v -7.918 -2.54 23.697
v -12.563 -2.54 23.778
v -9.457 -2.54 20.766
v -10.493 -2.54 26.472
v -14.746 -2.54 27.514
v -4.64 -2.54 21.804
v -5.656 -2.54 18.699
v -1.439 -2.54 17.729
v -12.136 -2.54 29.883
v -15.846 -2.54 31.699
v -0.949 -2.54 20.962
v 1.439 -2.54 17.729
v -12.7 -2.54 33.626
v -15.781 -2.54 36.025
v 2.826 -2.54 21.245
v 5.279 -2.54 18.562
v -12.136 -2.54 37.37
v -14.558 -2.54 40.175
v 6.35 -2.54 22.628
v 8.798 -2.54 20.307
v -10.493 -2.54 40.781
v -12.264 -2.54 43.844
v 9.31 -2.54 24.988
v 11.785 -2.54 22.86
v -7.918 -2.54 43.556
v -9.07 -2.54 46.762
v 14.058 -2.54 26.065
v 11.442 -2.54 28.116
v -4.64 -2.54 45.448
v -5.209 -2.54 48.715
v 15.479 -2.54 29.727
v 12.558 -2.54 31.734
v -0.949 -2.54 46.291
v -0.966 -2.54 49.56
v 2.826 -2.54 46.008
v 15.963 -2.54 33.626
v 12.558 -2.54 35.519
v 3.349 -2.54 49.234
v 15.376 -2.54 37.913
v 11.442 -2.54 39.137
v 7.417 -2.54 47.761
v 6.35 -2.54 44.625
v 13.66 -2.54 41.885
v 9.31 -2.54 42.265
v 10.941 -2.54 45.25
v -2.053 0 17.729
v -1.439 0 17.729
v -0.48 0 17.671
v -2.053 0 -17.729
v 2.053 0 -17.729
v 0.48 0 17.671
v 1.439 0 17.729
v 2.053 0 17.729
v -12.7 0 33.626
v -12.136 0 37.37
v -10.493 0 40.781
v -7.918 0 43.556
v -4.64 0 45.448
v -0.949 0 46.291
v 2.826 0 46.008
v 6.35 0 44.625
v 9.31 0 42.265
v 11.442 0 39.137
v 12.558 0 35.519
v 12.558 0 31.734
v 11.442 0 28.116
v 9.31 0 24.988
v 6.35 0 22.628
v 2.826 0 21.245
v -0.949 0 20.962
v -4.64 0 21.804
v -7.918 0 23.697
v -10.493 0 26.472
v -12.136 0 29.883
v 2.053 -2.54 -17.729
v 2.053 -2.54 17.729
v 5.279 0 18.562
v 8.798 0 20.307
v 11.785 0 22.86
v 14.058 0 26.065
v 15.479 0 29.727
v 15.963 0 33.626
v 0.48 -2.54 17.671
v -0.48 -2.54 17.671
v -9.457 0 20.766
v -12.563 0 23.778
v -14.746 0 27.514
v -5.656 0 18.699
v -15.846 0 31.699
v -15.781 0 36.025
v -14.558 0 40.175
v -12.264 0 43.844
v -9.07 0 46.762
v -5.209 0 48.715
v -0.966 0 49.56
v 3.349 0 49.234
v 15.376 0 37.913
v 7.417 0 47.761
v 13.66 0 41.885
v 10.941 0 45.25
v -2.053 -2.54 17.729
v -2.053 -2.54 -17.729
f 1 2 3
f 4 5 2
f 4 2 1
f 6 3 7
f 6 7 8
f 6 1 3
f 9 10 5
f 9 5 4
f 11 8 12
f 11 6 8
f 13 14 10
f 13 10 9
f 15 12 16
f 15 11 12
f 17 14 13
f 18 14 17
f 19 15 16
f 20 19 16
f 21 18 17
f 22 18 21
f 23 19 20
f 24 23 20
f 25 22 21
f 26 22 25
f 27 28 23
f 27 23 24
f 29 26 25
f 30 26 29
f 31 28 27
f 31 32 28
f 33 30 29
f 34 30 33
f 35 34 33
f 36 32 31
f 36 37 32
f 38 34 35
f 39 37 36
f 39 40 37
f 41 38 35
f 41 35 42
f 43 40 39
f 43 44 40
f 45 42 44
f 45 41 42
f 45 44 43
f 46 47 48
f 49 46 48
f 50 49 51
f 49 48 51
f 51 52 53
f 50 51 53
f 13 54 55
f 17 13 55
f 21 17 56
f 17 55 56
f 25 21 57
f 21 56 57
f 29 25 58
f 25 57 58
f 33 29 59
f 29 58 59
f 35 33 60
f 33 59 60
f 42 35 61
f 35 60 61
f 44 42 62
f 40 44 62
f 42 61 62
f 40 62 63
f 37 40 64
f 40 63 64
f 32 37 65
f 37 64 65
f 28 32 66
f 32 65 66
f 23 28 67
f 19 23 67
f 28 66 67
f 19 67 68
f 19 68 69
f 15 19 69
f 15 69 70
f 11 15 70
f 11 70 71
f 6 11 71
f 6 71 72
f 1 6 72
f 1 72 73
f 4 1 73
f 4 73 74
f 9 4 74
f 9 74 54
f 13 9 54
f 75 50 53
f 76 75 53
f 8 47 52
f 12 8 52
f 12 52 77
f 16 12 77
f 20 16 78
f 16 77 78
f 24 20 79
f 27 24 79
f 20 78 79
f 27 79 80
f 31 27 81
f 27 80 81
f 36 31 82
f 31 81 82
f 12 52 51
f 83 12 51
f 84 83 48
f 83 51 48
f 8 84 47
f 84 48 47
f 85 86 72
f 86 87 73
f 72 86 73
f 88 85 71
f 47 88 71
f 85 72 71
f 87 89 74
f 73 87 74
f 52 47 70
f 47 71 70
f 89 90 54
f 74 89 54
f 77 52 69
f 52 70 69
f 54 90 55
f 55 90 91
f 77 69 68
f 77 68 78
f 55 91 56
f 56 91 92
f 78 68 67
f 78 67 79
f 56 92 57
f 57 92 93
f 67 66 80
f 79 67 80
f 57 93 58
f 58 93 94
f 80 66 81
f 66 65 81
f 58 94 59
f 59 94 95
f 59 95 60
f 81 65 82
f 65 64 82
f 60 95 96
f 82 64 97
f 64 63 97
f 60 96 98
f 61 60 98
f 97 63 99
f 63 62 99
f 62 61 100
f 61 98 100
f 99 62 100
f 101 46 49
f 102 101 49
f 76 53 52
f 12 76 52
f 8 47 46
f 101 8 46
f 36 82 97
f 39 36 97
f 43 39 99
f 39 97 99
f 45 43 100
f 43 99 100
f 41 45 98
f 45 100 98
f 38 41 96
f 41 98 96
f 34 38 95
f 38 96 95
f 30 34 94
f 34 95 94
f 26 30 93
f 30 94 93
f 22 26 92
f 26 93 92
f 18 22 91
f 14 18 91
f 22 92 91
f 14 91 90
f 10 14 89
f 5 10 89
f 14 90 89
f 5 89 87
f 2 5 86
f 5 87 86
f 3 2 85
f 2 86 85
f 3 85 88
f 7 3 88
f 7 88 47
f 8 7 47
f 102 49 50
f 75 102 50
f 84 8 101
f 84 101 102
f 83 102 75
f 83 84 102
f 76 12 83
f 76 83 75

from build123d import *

# Parameters (mm, degrees)
F1_DEPTH = 2.54
F3_D     = 25.4


with BuildPart() as f1:
    # F0 (on Front) → F1 (new body)
    with BuildSketch(Plane.XZ):
        with BuildLine():
            Line((-1.4393192273, 17.7287627012), (1.4393192273, 17.7287627012))
            ThreePointArc((1.4393192273, 17.7287627012), (11.785157871, 22.8599728714), (15.9626004865, 33.6263403296))
            ThreePointArc((15.9626004865, 33.6263403296), (-10.7663674583, 45.4114982007), (-1.4393192273, 17.7287627012))
        make_face()
    extrude(amount=F1_DEPTH)

    # F3 (through all)
    with Locations(Plane.XZ.offset(2.54)):
        with Locations((0, 33.6263403296)):
            Hole(F3_D / 2)


with BuildPart() as f1b:
    # F0 (on Front) → F1, piece 2 (new body)
    with BuildSketch(Plane.XZ):
        with BuildLine():
            Line((-2.0534733776, -17.7287627012), (2.0534733776, -17.7287627012))
            Line((2.0534733776, -17.7287627012), (2.0534733776, 17.7287627012))
            Line((2.0534733776, 17.7287627012), (1.4393192273, 17.7287627012))
            ThreePointArc((1.4393192273, 17.7287627012), (0, 17.6637398431), (-1.4393192273, 17.7287627012))
            Line((-1.4393192273, 17.7287627012), (-2.0534733776, 17.7287627012))
            Line((-2.0534733776, 17.7287627012), (-2.0534733776, -17.7287627012))
        make_face()
    extrude(amount=F1_DEPTH)


solid = Compound([f1.part, f1b.part])
